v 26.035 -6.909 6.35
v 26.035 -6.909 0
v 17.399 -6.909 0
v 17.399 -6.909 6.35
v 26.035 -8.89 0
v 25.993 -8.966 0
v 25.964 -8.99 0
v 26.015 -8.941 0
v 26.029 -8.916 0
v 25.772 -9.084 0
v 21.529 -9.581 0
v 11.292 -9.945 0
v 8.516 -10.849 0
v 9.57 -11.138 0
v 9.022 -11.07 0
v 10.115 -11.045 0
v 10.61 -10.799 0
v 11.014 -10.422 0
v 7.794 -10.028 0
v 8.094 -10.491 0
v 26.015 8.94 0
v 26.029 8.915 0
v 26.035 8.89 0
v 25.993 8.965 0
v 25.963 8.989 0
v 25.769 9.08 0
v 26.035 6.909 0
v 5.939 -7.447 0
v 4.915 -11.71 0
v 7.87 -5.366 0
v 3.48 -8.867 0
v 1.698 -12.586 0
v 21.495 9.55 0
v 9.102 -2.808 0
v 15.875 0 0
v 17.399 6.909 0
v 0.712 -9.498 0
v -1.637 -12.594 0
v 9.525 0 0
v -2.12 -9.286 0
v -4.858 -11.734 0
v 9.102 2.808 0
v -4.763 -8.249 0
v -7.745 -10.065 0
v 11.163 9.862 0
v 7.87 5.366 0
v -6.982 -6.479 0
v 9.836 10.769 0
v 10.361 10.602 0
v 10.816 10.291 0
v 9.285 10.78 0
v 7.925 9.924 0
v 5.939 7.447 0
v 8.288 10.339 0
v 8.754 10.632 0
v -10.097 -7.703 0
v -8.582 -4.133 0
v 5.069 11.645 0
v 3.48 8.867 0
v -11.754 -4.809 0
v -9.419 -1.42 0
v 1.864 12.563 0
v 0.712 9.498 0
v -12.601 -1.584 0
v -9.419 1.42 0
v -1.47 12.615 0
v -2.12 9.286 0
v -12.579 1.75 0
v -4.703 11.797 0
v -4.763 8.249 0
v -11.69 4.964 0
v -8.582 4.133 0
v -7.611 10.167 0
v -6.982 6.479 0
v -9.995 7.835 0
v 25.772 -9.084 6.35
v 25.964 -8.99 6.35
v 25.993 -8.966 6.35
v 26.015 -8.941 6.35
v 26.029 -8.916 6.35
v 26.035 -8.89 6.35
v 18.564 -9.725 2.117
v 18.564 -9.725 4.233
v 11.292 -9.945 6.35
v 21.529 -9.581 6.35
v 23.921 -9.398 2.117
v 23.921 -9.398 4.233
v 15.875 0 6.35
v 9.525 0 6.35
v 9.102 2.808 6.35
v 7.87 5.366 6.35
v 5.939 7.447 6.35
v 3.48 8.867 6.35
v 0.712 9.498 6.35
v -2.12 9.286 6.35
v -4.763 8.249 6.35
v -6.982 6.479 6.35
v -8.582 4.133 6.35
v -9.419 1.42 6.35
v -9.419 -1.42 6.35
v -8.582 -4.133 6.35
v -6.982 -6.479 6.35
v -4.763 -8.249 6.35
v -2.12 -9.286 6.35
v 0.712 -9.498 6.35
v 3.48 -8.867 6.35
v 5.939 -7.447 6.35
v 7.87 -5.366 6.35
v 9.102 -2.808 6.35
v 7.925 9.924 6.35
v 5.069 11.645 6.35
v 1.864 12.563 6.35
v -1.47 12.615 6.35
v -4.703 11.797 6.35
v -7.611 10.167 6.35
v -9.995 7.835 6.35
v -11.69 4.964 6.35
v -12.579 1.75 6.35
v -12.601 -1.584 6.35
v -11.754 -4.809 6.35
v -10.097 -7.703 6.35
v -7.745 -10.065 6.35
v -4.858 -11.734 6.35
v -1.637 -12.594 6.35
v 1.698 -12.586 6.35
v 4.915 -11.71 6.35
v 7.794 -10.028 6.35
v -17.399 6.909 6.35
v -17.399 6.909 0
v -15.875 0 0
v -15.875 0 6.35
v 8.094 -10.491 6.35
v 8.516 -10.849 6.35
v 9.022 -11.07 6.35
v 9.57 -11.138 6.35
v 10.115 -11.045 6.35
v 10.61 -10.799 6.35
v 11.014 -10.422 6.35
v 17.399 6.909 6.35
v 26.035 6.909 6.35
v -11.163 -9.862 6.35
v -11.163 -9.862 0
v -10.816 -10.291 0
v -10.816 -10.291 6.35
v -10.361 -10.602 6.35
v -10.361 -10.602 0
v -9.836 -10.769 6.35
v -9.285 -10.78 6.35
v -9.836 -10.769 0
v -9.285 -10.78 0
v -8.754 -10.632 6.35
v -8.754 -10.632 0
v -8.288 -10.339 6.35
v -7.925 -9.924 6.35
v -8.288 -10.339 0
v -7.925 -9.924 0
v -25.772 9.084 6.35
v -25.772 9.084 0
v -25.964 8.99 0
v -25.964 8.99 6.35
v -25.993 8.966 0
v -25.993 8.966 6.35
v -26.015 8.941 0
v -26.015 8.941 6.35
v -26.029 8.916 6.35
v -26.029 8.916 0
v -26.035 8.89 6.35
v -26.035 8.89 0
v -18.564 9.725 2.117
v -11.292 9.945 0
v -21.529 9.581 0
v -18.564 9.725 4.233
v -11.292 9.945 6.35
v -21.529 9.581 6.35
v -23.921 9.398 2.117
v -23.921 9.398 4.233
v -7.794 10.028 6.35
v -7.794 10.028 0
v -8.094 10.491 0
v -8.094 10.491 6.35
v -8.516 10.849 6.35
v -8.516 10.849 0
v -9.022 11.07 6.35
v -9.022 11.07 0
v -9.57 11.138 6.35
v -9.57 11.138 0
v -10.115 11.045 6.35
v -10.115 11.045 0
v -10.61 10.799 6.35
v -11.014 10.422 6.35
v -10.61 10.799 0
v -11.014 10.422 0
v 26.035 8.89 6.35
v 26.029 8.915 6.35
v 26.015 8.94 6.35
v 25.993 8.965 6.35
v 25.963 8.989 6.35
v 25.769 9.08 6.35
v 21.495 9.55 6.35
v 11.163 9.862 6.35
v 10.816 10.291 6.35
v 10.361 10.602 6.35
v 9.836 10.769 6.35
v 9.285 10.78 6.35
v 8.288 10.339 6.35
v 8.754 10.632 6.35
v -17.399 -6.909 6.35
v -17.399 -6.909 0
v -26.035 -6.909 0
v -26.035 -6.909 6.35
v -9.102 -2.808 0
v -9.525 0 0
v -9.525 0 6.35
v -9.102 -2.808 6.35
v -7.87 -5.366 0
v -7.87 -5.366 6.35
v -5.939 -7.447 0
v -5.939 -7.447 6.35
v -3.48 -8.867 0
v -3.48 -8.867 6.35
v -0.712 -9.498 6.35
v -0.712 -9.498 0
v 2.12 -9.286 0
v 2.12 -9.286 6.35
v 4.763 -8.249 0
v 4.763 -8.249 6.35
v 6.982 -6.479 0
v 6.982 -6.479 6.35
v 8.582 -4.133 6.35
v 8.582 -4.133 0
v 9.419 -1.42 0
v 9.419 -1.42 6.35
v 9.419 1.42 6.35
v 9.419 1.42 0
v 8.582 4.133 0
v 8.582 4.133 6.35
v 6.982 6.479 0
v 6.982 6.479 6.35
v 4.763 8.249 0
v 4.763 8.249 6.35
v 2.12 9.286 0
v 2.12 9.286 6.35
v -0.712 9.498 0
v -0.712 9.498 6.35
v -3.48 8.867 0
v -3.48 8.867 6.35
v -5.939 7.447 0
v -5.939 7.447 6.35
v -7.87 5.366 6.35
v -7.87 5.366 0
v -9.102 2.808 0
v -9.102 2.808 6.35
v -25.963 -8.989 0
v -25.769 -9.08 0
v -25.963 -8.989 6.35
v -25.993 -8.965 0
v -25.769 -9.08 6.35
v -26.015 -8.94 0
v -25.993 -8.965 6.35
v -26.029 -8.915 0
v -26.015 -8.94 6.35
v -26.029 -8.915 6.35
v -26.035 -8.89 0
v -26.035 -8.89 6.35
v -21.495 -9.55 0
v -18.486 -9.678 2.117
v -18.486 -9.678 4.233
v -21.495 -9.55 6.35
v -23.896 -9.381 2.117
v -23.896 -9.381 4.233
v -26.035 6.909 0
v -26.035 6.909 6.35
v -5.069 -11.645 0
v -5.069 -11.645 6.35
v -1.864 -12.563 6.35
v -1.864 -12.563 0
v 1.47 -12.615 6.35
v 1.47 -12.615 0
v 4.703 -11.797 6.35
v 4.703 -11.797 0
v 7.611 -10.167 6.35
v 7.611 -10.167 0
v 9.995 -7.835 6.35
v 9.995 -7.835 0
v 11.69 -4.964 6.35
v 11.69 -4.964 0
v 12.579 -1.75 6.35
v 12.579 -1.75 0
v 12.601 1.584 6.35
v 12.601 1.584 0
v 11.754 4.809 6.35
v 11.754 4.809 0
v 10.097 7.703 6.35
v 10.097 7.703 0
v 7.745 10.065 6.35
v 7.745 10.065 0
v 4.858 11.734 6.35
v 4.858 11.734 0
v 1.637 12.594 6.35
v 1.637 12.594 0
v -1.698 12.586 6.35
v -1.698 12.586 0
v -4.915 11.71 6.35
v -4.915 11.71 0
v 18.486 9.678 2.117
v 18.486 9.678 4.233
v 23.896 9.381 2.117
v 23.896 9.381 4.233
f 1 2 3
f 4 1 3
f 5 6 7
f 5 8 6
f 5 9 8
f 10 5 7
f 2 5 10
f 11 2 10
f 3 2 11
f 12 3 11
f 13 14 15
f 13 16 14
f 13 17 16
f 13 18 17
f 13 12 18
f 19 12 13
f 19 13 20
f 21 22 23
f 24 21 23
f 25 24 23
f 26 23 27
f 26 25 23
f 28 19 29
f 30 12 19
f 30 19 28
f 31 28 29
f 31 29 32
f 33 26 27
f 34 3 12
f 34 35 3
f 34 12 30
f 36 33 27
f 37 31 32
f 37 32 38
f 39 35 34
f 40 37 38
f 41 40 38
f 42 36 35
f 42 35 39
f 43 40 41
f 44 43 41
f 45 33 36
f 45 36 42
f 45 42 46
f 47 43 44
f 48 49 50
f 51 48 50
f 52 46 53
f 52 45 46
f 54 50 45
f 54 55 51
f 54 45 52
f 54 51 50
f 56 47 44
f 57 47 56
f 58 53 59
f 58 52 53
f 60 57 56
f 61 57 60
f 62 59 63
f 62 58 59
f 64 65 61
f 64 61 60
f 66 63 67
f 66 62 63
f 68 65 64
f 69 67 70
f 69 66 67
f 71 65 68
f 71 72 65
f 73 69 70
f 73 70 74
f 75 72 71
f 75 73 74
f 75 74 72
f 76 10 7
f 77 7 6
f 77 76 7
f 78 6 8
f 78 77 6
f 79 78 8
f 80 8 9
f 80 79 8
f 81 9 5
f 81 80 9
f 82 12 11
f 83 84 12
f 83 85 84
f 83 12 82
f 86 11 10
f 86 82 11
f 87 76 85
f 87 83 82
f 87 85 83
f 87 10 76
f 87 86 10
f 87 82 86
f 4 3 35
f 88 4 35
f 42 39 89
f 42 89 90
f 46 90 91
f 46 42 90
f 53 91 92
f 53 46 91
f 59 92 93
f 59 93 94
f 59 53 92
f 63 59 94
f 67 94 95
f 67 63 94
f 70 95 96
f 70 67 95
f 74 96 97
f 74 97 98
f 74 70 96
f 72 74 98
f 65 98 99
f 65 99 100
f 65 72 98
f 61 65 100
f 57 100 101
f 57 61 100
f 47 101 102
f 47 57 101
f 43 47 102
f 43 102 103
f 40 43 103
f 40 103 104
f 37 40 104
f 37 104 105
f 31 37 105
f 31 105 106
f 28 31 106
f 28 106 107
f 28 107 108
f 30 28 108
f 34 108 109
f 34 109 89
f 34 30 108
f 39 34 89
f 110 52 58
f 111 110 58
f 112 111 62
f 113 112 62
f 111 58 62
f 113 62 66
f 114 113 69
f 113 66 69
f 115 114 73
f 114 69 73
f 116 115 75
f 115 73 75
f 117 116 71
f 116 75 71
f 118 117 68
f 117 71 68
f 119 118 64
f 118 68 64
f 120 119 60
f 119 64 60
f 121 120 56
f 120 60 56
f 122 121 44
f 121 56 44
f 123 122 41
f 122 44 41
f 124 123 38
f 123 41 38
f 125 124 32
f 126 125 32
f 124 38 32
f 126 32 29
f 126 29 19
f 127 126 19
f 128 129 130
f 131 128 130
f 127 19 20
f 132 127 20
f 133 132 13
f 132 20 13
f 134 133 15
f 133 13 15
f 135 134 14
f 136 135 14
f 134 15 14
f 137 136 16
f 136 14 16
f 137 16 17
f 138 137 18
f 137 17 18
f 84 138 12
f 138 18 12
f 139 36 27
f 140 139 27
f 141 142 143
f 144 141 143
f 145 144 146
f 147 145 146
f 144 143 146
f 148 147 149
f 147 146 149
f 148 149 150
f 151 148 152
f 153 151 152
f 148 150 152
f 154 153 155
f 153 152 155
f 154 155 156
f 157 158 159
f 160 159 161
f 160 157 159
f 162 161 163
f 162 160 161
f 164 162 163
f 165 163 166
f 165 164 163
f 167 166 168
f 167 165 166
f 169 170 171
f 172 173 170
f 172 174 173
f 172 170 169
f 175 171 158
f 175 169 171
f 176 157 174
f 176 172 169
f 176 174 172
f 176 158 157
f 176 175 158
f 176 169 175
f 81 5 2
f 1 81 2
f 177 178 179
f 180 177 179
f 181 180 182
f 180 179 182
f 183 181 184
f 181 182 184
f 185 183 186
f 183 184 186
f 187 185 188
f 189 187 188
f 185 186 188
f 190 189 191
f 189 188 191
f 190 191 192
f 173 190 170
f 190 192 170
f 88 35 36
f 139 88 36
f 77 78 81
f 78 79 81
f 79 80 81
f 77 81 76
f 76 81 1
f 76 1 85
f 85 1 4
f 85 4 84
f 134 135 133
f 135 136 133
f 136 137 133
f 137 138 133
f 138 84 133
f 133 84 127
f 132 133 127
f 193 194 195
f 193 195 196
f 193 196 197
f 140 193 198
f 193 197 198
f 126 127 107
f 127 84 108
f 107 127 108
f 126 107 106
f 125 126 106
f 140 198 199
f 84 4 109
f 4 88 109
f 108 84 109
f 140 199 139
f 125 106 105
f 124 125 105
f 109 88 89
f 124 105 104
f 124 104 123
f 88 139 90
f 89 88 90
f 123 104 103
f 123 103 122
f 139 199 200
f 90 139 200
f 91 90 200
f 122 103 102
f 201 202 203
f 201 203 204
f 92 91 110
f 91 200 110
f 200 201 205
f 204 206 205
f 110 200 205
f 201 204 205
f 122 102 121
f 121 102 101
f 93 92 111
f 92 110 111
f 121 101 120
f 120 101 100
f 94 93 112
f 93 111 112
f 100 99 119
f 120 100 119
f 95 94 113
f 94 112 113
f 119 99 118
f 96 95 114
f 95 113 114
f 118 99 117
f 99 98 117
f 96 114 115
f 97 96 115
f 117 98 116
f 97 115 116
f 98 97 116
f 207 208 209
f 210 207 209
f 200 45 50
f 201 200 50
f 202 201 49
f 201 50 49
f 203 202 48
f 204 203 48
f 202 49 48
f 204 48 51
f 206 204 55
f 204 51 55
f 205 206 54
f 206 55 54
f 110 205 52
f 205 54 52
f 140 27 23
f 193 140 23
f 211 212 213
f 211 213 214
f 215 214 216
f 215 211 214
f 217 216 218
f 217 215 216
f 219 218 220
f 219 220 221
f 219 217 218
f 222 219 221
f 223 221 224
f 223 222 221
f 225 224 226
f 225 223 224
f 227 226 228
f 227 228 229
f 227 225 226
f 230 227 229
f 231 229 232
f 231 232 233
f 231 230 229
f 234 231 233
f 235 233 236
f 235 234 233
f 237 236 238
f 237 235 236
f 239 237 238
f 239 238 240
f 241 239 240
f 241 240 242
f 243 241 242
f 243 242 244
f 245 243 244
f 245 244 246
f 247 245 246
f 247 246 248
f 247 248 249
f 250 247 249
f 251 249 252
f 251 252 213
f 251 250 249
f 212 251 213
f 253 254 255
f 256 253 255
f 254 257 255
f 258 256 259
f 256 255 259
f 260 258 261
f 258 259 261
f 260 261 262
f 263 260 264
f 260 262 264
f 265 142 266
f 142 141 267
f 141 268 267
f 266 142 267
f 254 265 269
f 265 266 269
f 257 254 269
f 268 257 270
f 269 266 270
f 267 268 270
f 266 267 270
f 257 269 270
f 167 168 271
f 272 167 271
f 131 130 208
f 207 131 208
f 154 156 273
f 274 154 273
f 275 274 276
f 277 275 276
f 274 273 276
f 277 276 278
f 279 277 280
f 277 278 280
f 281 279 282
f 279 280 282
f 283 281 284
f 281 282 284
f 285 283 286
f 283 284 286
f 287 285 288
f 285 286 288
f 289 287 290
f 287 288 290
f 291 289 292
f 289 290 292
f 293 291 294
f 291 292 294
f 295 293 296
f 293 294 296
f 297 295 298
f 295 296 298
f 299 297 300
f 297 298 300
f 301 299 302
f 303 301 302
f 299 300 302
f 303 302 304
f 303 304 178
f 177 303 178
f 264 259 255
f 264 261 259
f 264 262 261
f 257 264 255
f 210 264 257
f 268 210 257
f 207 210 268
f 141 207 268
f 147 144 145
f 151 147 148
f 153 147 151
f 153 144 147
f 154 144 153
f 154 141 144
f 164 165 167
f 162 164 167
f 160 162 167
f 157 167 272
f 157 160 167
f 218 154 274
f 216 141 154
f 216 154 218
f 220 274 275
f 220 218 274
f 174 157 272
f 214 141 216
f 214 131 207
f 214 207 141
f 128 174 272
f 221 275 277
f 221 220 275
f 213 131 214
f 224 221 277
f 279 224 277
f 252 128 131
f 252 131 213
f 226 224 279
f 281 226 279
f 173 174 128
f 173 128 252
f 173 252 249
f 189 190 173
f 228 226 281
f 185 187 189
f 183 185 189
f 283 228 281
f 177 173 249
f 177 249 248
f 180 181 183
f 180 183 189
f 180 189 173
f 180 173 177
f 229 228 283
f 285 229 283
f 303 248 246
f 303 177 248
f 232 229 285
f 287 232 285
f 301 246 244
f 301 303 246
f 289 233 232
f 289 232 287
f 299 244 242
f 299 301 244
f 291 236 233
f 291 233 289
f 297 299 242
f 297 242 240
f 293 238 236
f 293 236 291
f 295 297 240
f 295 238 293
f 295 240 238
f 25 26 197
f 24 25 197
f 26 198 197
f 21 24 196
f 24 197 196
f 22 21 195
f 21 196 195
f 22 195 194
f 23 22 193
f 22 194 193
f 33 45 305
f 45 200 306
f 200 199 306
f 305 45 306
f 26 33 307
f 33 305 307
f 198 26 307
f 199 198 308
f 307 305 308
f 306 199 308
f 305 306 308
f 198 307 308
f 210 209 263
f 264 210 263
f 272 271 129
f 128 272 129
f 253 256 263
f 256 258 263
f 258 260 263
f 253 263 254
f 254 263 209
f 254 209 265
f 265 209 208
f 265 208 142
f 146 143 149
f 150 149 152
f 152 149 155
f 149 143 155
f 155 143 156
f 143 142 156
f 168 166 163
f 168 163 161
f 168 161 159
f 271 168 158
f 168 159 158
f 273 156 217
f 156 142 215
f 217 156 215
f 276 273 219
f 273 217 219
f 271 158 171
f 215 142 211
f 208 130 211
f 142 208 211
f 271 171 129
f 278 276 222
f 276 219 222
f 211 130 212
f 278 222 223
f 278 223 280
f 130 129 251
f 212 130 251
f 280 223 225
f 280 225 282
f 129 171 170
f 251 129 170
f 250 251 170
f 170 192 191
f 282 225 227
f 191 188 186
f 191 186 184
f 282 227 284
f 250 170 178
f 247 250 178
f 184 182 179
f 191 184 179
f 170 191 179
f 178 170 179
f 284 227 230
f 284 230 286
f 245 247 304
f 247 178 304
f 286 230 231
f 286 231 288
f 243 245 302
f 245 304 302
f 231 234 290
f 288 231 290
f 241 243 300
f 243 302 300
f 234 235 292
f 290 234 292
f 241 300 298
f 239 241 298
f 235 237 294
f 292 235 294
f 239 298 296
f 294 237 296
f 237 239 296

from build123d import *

# Parameters (mm, degrees)
F0_R     = 9.525
F1_DEPTH = 6.35
F3_COUNT = 2
F5_DEPTH = 6.35
F7_DEPTH = 6.35


with BuildPart() as f1:
    # F0 (on Top) → F1 (new body)
    with BuildSketch(Plane.XY):
        with BuildLine():
            Line((9.525, 0), (12.7, 0))
            ThreePointArc((12.7, 0), (12.1234798492, 3.7830194747), (10.4462619928, 7.2225764363))
            ThreePointArc((10.4462619928, 7.2225764363), (10.00070112, 7.0453500483), (9.525, 6.985))
            Line((9.525, 6.985), (9.525, 0))
        make_face()
        with BuildLine():
            ThreePointArc((9.525, -8.4002604126), (9.9057858228, -7.9476667791), (10.2650859452, -7.4778346155))
            ThreePointArc((10.2650859452, -7.4778346155), (9.9025309799, -7.3659812593), (9.525, -7.3281971973))
            Line((9.525, -7.3281971973), (9.525, -8.4002604126))
        make_face()
        with BuildLine():
            ThreePointArc((11.3988304843, -8.89), (11.0104940402, -8.040581393), (10.2650859452, -7.4778346155))
            ThreePointArc((10.2650859452, -7.4778346155), (9.9057858228, -7.9476667791), (9.525, -8.4002604126))
            Line((9.525, -8.4002604126), (9.525, -8.89))
            Line((9.525, -8.89), (11.3988304843, -8.89))
        make_face()
        with BuildLine():
            ThreePointArc((7.7935067776, -10.0275247248), (8.6973942383, -9.2544764013), (9.525, -8.4002604126))
            Line((9.525, -8.4002604126), (9.525, -7.3281971973))
            ThreePointArc((9.525, -7.3281971973), (7.921532049, -8.2046469895), (7.7935067776, -10.0275247248))
        make_face()
        with BuildLine():
            Line((9.525, 6.985), (9.525, 8.4002604126))
            ThreePointArc((9.525, 8.4002604126), (8.7581956911, 9.196956466), (7.9249969146, 9.9239318772))
            ThreePointArc((7.9249969146, 9.9239318772), (7.8518793788, 7.9791254823), (9.525, 6.985))
        make_face()
        with BuildLine():
            ThreePointArc((10.4462619928, 7.2225764363), (12.1234798492, 3.7830194747), (12.7, 0))
            Line((12.7, 0), (15.875, 0))
            Line((15.875, 0), (17.399, 6.9088))
            Line((17.399, 6.9088), (26.035, 6.9088))
            Line((26.035, 6.9088), (26.035, 8.89))
            Line((26.035, 8.89), (11.43, 8.89))
            ThreePointArc((11.43, 8.89), (11.1657359776, 7.922006998), (10.4462619928, 7.2225764363))
        make_face()
        with BuildLine():
            ThreePointArc((9.525, 6.985), (10.00070112, 7.0453500483), (10.4462619928, 7.2225764363))
            ThreePointArc((10.4462619928, 7.2225764363), (10.0029776208, 7.8249880969), (9.525, 8.4002604126))
            Line((9.525, 8.4002604126), (9.525, 6.985))
        make_face()
        with BuildLine():
            ThreePointArc((9.525, 8.4002604126), (10.0029776208, 7.8249880969), (10.4462619928, 7.2225764363))
            ThreePointArc((10.4462619928, 7.2225764363), (11.1657359776, 7.922006998), (11.43, 8.89))
            Line((11.43, 8.89), (9.525, 8.89))
            Line((9.525, 8.89), (9.525, 8.4002604126))
        make_face()
        with BuildLine():
            Line((9.525, -8.89), (9.525, -8.4002604126))
            ThreePointArc((9.525, -8.4002604126), (8.6973942383, -9.2544764013), (7.7935067776, -10.0275247248))
            ThreePointArc((7.7935067776, -10.0275247248), (9.9315282348, -11.0943150857), (11.43, -9.2331971973))
            ThreePointArc((11.43, -9.2331971973), (11.4221916182, -9.0608923403), (11.3988304843, -8.89))
            Line((11.3988304843, -8.89), (9.525, -8.89))
        make_face()
        with BuildLine():
            ThreePointArc((7.9249969146, 9.9239318772), (8.7581956911, 9.196956466), (9.525, 8.4002604126))
            Line((9.525, 8.4002604126), (9.525, 8.89))
            Line((9.525, 8.89), (11.43, 8.89))
            ThreePointArc((11.43, 8.89), (10.0639893887, 10.7171604852), (7.9249969146, 9.9239318772))
        make_face()
        with BuildLine():
            Line((15.875, 0), (12.7, 0))
            ThreePointArc((12.7, 0), (12.075938711, -3.9321373638), (10.2650859452, -7.4778346155))
            ThreePointArc((10.2650859452, -7.4778346155), (11.0104940402, -8.040581393), (11.3988304843, -8.89))
            Line((11.3988304843, -8.89), (26.035, -8.89))
            Line((26.035, -8.89), (26.035, -6.9088))
            Line((26.035, -6.9088), (17.399, -6.9088))
            Line((17.399, -6.9088), (15.875, 0))
        make_face()
        with BuildLine():
            ThreePointArc((10.2650859452, -7.4778346155), (12.075938711, -3.9321373638), (12.7, 0))
            Line((12.7, 0), (9.525, 0))
            Line((9.525, 0), (9.525, -7.3281971973))
            ThreePointArc((9.525, -7.3281971973), (9.9025309799, -7.3659812593), (10.2650859452, -7.4778346155))
        make_face()
        with BuildLine():
            Line((9.525, -7.3281971973), (9.525, 0))
            Line((9.525, 0), (9.525, 6.985))
            ThreePointArc((9.525, 6.985), (7.8518793788, 7.9791254823), (7.9249969146, 9.9239318772))
            ThreePointArc((7.9249969146, 9.9239318772), (-12.6997241984, 0.0836975719), (7.7935067776, -10.0275247248))
            ThreePointArc((7.7935067776, -10.0275247248), (7.921532049, -8.2046469895), (9.525, -7.3281971973))
        make_face()
        Circle(F0_R, mode=Mode.SUBTRACT)
    extrude(amount=F1_DEPTH)


with BuildPart() as f3_1:
    # F3: instance of F1
    add(f1.part.rotate(Axis((0, 0, 3.175), (0, 0, 1)), 1 * 360 / F3_COUNT))

    # F4 (on face) → F5 (join)
    with BuildSketch(Plane.XY.offset(6.35)):
        with BuildLine():
            ThreePointArc((-11.3988304843, 8.89), (-11.4203300474, 9.4248975143), (-11.292158803, 9.9446567992))
            add(Edge.make_bspline(
                [(-11.292158803, 9.9446567992), (-19.0800902505, 9.7532636566), (-25.9840726435, 9.5126047878), (-26.035, 8.89)],
                knots=[0.0760413278, 0.0760413278, 0.0760413278, 0.0760413278, 0.5895310388, 0.5895310388, 0.5895310388, 0.5895310388], degree=3))
            Line((-26.035, 8.89), (-11.3988304843, 8.89))
        make_face()
        with BuildLine():
            add(Edge.make_bspline(
                [(-11.1630940381, -9.8624571571), (-18.9901595908, -9.7079309813), (-25.9831452308, -9.5041039445), (-26.035, -8.89)],
                knots=[0.0707311301, 0.0707311301, 0.0707311301, 0.0707311301, 0.588617497, 0.588617497, 0.588617497, 0.588617497], degree=3))
            ThreePointArc((-11.1630940381, -9.8624571571), (-11.3620620761, -9.3942102029), (-11.43, -8.89))
            Line((-11.43, -8.89), (-26.035, -8.89))
        make_face()
    extrude(amount=-F5_DEPTH)


with BuildPart() as f1_1:
    add(f1.part)

    # F6 (on face) → F7 (join)
    with BuildSketch(Plane.XY.offset(6.35)):
        with BuildLine():
            add(Edge.make_bspline(
                [(11.1630940381, 9.8624571571), (18.9901595908, 9.7079309813), (25.9831452308, 9.5041039445), (26.035, 8.89)],
                knots=[0.0707311301, 0.0707311301, 0.0707311301, 0.0707311301, 0.588617497, 0.588617497, 0.588617497, 0.588617497], degree=3))
            ThreePointArc((11.1630940381, 9.8624571571), (11.3620620761, 9.3942102029), (11.43, 8.89))
            Line((11.43, 8.89), (26.035, 8.89))
        make_face()
        with BuildLine():
            ThreePointArc((11.3988304843, -8.89), (11.4203300474, -9.4248975143), (11.292158803, -9.9446567992))
            add(Edge.make_bspline(
                [(11.292158803, -9.9446567992), (19.0800902505, -9.7532636566), (25.9840726435, -9.5126047878), (26.035, -8.89)],
                knots=[0.0760413278, 0.0760413278, 0.0760413278, 0.0760413278, 0.5895310388, 0.5895310388, 0.5895310388, 0.5895310388], degree=3))
            Line((26.035, -8.89), (11.3988304843, -8.89))
        make_face()
    extrude(amount=-F7_DEPTH)


solid = Compound([f3_1.part, f1_1.part])
